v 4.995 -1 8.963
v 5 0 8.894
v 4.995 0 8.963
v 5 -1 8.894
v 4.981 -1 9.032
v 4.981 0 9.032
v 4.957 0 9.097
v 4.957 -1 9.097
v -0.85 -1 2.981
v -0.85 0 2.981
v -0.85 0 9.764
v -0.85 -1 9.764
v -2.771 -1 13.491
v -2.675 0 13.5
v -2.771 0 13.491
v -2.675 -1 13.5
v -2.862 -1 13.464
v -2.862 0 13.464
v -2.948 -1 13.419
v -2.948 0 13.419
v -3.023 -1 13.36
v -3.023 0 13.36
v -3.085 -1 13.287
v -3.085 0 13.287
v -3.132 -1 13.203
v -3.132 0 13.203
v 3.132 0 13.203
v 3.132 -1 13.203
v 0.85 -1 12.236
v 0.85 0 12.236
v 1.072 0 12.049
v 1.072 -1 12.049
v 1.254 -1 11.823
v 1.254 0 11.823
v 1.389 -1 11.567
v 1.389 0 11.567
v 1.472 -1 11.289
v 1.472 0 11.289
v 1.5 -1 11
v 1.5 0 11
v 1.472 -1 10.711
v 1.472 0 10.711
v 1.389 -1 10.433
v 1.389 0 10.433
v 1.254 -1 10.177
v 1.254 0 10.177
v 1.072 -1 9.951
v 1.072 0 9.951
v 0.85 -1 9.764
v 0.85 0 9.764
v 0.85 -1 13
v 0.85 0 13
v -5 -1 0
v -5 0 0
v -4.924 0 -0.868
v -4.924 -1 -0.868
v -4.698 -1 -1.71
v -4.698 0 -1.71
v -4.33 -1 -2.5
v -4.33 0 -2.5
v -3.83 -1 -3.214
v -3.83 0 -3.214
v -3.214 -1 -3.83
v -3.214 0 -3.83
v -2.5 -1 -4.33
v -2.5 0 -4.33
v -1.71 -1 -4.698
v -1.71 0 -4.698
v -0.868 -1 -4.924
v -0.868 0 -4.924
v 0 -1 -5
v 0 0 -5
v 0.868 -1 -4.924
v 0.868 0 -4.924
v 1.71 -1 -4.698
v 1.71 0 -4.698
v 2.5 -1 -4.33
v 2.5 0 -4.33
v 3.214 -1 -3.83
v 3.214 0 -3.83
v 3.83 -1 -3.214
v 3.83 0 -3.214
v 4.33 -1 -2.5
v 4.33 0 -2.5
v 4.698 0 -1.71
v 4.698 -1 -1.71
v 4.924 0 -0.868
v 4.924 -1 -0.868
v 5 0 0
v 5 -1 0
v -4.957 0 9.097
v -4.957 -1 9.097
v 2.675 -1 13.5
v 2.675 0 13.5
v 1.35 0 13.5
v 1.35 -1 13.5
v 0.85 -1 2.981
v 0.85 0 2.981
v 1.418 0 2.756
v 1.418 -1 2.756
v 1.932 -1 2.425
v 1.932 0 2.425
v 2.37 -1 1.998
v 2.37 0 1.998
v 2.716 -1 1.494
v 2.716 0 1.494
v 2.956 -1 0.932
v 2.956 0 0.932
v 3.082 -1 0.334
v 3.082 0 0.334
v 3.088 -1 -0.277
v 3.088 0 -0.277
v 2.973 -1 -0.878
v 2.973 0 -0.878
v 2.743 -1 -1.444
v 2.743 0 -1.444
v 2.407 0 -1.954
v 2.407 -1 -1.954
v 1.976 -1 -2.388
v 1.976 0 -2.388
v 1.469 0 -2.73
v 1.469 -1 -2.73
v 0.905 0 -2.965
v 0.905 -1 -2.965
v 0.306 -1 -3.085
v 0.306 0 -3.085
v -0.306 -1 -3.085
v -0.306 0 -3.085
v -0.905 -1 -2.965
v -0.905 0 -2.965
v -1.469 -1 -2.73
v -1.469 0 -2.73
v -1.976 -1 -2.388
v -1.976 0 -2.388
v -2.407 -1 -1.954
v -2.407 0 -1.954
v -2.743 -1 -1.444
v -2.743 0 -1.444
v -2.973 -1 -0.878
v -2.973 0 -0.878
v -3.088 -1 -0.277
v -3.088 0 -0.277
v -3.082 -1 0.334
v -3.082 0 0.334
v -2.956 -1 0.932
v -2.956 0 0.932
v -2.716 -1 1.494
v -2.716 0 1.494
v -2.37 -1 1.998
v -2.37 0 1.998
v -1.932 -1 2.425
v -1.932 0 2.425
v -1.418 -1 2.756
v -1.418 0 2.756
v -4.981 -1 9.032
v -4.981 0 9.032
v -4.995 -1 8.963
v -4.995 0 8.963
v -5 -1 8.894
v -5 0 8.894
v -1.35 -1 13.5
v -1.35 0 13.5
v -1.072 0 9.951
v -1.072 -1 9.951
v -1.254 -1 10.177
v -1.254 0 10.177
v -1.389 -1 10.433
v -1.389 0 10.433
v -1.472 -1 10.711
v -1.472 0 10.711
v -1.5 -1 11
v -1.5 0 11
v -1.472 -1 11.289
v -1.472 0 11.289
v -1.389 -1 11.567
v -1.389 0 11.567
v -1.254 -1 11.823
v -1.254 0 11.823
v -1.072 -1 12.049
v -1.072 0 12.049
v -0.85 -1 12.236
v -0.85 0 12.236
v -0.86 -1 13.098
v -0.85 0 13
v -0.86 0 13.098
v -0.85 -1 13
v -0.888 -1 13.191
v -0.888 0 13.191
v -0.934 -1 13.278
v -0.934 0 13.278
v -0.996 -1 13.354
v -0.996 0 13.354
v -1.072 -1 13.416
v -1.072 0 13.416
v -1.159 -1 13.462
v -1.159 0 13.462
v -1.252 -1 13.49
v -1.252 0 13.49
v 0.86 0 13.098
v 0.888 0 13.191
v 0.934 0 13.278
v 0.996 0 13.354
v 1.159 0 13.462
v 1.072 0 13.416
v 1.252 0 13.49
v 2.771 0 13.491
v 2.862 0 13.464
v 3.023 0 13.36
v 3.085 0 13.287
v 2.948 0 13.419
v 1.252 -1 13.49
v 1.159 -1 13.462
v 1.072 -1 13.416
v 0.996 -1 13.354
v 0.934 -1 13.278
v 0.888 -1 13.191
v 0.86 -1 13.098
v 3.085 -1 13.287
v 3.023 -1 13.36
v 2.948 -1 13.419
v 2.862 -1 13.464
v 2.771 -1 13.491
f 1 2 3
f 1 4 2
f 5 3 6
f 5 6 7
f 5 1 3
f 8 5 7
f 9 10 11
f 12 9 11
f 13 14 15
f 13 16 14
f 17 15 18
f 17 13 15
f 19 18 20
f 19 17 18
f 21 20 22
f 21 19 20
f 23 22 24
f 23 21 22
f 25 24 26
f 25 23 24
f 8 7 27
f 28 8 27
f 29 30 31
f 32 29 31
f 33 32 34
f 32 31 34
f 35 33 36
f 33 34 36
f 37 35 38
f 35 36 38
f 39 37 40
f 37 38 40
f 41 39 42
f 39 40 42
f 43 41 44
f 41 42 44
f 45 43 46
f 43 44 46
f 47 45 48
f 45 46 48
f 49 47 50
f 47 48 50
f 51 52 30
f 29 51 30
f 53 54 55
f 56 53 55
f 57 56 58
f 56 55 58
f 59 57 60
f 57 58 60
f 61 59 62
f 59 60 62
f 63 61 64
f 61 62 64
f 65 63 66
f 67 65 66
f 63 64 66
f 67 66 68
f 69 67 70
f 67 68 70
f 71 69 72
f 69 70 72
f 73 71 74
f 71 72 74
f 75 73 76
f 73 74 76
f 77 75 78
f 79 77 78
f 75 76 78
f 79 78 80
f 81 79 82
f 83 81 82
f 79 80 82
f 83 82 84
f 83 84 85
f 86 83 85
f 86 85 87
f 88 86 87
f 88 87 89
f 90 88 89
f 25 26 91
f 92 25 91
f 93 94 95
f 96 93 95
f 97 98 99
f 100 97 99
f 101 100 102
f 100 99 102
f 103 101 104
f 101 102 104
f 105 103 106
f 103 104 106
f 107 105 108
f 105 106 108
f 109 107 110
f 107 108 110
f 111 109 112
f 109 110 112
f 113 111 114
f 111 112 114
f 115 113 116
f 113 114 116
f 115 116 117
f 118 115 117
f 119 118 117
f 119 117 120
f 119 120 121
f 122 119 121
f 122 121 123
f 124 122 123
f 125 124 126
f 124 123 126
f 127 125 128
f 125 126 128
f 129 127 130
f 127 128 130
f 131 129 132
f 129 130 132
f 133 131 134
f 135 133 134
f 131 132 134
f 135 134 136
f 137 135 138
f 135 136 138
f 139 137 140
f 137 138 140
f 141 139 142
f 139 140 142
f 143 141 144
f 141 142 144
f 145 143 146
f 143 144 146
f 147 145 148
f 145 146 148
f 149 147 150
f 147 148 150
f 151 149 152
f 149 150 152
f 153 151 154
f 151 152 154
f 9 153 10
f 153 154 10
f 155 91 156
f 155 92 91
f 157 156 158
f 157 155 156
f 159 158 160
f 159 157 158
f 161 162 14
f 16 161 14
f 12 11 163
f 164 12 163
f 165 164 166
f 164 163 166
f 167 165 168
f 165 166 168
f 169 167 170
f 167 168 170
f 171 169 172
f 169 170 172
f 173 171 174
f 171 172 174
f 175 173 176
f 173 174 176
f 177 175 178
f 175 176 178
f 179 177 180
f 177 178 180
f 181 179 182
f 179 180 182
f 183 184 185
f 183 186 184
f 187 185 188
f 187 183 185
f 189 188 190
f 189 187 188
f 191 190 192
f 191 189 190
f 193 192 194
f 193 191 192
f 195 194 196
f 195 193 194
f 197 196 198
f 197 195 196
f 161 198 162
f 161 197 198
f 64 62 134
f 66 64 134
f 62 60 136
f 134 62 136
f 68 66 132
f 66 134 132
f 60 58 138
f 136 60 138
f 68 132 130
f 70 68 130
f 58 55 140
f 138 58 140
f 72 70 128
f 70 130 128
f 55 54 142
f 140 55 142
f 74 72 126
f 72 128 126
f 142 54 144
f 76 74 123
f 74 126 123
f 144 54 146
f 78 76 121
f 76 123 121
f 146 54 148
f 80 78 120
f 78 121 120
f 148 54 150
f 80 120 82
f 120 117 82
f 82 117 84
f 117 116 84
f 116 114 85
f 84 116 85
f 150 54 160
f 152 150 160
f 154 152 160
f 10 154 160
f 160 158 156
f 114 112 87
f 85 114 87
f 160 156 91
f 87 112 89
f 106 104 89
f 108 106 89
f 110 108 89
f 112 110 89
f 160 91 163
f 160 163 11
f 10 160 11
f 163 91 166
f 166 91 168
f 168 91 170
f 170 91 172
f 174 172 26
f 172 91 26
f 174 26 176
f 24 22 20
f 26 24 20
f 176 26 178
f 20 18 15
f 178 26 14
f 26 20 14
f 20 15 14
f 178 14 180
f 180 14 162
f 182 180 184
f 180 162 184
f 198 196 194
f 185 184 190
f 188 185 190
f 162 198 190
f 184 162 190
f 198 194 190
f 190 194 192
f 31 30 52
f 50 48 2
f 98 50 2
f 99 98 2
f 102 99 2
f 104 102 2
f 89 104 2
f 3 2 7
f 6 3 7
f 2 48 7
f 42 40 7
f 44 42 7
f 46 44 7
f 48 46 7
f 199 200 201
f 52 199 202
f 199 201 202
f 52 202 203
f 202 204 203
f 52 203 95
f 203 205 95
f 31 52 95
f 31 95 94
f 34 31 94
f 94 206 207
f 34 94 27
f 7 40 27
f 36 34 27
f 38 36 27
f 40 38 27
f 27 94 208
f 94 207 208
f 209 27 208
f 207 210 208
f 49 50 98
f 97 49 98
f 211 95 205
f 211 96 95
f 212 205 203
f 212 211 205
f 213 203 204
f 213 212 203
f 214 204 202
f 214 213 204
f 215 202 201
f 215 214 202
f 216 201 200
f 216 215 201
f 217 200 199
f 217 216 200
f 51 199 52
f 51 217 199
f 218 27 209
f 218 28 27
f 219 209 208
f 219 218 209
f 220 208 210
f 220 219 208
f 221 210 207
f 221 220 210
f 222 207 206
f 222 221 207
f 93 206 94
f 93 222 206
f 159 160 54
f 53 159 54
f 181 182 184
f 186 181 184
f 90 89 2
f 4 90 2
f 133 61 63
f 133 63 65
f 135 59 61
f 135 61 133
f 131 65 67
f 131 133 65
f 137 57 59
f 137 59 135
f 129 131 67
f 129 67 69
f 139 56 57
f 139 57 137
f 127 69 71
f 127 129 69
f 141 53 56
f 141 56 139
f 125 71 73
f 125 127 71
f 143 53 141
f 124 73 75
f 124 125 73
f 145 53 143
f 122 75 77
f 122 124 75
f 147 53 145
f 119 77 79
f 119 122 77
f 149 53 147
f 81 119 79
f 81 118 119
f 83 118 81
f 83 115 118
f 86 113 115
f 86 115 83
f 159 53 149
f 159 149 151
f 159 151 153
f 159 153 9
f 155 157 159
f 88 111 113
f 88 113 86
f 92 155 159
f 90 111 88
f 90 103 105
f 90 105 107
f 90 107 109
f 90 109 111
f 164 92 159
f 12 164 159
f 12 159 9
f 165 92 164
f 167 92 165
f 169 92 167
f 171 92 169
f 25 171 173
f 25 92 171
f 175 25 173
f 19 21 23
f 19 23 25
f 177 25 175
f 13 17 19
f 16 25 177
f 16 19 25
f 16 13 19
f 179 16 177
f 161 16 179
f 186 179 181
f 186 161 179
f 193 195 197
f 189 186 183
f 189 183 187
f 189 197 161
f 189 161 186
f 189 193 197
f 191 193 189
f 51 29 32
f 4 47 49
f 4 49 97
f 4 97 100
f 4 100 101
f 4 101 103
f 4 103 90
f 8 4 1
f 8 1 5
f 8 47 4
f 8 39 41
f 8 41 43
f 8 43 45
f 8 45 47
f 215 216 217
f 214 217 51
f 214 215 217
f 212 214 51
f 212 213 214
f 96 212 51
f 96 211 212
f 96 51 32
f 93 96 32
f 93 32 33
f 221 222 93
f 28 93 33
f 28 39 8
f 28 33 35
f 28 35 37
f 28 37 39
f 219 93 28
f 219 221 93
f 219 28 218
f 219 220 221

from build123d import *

# Parameters (mm, degrees)
F1_DEPTH = 1
F2_R     = 0.5


with BuildPart() as f1:
    # F0 (on Front) → F1 (new body)
    with BuildSketch(Plane.XZ):
        with BuildLine():
            ThreePointArc((0.85, 2.981191), (0, -3.1), (-0.85, 2.981191))
            Line((-0.85, 2.981191), (-0.85, 9.764079))
            ThreePointArc((-0.85, 9.764079), (-1.5, 11), (-0.85, 12.235921))
            Line((-0.85, 12.235921), (-0.85, 13.5))
            Line((-0.85, 13.5), (-3, 13.5))
            Line((-3, 13.5), (-5, 9))
            Line((-5, 9), (-5, 0))
            ThreePointArc((-5, 0), (0, -5), (5, 0))
            Line((5, 0), (5, 9))
            Line((5, 9), (3, 13.5))
            Line((3, 13.5), (0.85, 13.5))
            Line((0.85, 13.5), (0.85, 12.235921))
            ThreePointArc((0.85, 12.235921), (1.5, 11), (0.85, 9.764079))
            Line((0.85, 9.764079), (0.85, 2.981191))
        make_face()
    extrude(amount=F1_DEPTH)

    # F2
    f2_edges = [f1.edges().sort_by_distance(p)[0] for p in [
        (3, -0.5, 13.5),
        (0.85, -0.5, 13.5),
        (-0.85, -0.5, 13.5),
        (-3, -0.5, 13.5),
        (-5, -0.5, 9),
        (5, -0.5, 9),
    ]]
    fillet(f2_edges, radius=F2_R)


solid = f1.part
